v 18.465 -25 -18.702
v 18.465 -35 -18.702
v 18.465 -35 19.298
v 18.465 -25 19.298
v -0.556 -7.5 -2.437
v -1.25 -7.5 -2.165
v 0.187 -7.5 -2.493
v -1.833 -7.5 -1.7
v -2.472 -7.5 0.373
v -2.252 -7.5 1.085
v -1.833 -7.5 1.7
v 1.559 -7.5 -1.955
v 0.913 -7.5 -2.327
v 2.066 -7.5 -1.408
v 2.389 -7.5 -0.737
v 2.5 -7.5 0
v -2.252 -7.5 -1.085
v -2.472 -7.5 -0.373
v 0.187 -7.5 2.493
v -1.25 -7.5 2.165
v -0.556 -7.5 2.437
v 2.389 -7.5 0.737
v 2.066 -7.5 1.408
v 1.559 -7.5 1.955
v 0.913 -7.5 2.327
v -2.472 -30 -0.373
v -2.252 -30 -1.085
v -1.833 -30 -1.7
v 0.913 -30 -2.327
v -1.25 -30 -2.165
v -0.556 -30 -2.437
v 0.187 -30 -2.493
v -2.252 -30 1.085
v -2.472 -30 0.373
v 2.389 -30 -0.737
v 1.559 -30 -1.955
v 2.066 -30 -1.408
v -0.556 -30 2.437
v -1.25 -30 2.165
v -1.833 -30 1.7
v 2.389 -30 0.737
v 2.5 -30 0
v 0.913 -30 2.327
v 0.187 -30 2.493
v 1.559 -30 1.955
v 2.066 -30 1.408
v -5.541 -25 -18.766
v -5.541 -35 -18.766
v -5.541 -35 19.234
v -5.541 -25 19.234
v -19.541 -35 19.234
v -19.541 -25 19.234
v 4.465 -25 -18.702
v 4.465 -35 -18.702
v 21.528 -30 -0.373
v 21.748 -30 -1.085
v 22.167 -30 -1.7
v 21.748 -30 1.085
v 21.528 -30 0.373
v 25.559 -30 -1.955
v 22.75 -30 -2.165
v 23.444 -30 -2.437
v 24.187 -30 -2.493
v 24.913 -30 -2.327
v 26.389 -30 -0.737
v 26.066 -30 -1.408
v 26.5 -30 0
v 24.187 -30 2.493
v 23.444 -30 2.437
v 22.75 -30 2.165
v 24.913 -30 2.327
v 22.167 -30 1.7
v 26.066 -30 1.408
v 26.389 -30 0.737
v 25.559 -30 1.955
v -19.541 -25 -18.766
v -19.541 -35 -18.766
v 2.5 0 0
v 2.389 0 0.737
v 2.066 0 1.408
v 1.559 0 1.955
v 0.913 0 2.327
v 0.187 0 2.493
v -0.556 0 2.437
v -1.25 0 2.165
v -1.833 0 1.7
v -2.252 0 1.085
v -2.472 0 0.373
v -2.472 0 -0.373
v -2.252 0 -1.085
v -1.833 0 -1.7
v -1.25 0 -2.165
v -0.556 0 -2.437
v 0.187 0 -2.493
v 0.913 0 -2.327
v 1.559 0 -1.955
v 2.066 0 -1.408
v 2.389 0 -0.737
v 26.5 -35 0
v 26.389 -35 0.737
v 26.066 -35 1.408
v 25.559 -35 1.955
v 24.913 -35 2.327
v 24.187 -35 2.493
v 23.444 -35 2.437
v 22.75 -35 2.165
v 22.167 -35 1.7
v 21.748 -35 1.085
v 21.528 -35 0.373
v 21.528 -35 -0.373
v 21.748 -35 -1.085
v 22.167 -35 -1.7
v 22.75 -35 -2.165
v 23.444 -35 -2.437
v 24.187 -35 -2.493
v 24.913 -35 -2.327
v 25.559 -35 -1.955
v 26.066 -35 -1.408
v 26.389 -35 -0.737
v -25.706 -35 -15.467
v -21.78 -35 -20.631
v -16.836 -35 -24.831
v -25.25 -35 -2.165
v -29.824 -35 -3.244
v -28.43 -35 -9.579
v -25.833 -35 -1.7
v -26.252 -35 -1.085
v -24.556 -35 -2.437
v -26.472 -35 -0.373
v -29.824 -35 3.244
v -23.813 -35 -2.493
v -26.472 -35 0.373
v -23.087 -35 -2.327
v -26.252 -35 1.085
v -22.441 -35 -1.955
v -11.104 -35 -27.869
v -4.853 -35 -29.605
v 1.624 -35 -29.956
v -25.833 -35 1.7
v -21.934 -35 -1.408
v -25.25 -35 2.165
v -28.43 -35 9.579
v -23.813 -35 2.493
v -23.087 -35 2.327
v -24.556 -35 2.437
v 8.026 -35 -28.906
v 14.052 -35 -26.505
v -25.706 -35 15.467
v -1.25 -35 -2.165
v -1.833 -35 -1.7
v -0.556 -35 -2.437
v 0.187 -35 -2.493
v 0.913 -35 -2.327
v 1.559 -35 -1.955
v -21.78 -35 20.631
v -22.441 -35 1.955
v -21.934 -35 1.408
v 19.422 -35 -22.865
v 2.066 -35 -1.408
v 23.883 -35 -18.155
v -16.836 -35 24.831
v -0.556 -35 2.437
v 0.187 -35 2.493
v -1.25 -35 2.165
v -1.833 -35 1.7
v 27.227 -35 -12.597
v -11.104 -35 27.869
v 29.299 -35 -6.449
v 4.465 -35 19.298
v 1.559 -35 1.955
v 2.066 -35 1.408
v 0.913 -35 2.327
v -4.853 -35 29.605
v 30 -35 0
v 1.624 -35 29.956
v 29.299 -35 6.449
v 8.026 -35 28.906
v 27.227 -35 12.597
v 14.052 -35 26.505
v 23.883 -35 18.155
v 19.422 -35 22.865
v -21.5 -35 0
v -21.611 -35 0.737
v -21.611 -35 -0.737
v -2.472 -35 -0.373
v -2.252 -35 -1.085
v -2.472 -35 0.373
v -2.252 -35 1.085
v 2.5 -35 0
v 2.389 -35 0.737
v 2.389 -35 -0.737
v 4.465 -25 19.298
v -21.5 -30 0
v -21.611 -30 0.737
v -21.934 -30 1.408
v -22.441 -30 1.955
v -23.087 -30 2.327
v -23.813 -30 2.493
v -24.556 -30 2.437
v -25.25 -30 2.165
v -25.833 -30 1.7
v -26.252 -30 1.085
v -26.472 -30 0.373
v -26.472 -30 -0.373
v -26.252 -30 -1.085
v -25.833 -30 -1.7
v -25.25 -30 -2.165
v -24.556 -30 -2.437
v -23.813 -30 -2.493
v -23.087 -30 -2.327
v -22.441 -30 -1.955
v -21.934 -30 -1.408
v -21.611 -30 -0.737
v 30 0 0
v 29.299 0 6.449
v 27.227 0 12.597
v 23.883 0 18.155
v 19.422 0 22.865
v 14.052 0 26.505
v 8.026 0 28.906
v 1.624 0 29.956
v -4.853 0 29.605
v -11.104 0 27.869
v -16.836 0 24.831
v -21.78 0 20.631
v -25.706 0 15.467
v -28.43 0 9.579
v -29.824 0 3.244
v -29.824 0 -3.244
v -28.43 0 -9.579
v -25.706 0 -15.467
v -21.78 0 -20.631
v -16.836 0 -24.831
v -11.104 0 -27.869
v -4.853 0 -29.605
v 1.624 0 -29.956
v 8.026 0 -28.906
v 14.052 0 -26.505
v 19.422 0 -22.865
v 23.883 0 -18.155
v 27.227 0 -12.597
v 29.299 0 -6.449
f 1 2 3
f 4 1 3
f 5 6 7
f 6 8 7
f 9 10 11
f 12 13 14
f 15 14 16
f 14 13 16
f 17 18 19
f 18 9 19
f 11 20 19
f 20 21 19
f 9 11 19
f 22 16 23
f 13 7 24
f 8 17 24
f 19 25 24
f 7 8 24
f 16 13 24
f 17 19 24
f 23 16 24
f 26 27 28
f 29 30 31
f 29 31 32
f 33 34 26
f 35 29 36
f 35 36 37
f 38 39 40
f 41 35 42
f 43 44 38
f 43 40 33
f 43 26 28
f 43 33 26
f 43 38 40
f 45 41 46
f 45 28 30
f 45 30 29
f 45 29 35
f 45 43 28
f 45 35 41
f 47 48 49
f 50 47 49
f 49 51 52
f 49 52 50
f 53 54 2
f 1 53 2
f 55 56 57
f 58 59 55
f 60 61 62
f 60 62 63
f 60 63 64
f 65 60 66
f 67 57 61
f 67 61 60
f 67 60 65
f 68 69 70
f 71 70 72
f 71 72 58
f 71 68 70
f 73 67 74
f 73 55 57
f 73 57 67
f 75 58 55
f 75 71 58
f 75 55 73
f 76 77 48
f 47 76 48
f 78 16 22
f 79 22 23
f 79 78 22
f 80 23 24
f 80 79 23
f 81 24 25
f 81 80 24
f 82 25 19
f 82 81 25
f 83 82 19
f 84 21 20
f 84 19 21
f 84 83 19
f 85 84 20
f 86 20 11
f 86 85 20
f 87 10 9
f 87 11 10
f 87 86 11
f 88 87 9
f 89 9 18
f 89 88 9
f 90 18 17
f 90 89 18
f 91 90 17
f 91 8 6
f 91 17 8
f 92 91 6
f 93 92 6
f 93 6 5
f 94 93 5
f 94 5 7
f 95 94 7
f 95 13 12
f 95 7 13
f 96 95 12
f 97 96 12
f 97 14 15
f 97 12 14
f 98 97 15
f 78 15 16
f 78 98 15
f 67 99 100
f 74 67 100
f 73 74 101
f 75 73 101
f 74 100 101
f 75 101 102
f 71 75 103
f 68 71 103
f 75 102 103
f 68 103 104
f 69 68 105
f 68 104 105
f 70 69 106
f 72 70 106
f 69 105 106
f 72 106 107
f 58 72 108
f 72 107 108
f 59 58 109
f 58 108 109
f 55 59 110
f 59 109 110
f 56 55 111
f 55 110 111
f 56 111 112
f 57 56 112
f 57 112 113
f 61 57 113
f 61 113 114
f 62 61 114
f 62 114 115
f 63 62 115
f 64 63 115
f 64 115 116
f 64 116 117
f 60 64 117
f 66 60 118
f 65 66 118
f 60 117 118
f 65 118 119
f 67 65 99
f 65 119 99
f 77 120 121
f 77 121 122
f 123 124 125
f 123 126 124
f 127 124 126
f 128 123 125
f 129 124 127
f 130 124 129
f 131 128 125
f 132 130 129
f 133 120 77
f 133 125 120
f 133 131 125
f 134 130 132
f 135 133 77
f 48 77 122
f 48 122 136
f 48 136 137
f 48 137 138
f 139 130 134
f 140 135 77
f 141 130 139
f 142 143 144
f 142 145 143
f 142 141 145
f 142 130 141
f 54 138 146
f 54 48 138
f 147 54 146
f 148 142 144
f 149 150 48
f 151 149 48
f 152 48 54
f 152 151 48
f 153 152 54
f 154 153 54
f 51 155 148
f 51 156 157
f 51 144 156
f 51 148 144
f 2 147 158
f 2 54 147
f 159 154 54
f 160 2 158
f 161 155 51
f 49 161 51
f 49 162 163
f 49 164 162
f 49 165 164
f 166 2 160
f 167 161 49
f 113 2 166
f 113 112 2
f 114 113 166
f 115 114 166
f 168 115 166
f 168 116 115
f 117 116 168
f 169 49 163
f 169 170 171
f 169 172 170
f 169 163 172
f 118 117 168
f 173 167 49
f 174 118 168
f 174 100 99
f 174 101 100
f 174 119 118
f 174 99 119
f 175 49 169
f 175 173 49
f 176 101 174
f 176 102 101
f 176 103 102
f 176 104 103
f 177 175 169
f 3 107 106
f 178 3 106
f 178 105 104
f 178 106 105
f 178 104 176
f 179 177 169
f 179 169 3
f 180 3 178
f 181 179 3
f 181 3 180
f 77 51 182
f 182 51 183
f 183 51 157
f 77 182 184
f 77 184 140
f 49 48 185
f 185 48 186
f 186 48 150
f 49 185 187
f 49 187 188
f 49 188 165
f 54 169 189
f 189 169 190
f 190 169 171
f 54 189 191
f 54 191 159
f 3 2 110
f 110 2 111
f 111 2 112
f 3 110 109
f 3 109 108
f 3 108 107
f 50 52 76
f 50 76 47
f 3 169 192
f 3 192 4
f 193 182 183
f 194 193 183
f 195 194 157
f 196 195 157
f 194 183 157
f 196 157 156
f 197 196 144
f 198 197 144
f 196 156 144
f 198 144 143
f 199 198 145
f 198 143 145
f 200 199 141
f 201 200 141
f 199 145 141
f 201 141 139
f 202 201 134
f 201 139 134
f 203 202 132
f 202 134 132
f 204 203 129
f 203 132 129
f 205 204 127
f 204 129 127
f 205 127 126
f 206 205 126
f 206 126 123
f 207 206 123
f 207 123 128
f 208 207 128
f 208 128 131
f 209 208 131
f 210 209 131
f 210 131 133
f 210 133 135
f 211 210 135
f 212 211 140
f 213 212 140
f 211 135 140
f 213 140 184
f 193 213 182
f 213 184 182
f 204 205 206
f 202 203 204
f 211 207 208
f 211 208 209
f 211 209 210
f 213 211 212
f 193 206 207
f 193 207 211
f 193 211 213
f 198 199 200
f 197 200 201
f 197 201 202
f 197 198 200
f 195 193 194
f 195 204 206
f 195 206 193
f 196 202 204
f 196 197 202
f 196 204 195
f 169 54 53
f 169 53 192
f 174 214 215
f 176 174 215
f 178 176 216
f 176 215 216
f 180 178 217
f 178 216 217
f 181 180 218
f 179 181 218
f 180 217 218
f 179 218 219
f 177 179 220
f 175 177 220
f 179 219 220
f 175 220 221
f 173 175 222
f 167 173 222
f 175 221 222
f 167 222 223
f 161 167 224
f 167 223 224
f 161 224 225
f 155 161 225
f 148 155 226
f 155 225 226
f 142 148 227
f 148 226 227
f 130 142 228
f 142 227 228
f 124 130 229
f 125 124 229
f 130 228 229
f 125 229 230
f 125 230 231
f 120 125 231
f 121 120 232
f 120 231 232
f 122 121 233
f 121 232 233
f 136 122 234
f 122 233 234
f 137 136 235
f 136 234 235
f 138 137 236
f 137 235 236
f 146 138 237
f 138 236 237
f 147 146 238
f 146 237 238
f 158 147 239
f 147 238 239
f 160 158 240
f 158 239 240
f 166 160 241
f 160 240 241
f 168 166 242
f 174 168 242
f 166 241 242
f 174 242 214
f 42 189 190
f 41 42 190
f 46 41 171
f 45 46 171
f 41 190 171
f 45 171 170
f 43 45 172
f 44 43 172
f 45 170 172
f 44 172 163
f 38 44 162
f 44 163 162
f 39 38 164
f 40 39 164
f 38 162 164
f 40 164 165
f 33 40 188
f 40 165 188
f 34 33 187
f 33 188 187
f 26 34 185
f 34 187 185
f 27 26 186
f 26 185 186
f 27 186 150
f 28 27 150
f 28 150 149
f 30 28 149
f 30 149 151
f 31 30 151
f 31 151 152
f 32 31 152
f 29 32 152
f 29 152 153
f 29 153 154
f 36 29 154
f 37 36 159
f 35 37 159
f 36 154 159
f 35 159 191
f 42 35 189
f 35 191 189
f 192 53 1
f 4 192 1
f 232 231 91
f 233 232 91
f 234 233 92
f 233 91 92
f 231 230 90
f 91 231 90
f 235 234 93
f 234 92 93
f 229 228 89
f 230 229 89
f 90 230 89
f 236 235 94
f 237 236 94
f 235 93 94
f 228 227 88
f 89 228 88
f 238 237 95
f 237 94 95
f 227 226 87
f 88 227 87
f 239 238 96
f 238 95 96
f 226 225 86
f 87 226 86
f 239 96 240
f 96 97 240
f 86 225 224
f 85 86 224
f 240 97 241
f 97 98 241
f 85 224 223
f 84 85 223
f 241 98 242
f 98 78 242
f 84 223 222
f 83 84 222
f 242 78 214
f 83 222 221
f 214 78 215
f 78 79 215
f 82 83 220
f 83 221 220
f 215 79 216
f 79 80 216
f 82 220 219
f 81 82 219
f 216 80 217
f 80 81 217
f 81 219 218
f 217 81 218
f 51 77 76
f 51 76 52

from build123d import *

# Parameters (mm, degrees)
F0_R     = 30
F1_DEPTH = 35
F3_T     = -27.5
F4_W     = 14
F4_H     = 38
F5_DEPTH = 10
F6_R     = 2.5
F7_DEPTH = 5


with BuildPart() as f1:
    # F0 (on Front) → F1 (new body)
    with BuildSketch(Plane.XZ):
        Circle(F0_R)
    extrude(amount=F1_DEPTH)

    # F3
    f3_openings = [f1.faces().sort_by_distance(p)[0] for p in [
        (0, 0, 0),
    ]]
    offset(amount=F3_T, openings=f3_openings)

    # F4 (on face) → F5 (cut)
    with BuildSketch(Plane.XZ.offset(35)):
        with Locations((-12.541194, 0.233546)):
            Rectangle(F4_W, F4_H)
        with Locations((11.464599, 0.298456)):
            Rectangle(F4_W, F4_H)
    extrude(amount=-F5_DEPTH, mode=Mode.SUBTRACT)

    # F6 (on face) → F7 (cut)
    with BuildSketch(Plane.XZ.offset(35)):
        Circle(F6_R)
        with Locations((-24, 0)):
            Circle(F6_R)
        with Locations((24, 0)):
            Circle(F6_R)
    extrude(amount=-F7_DEPTH, mode=Mode.SUBTRACT)


solid = f1.part
